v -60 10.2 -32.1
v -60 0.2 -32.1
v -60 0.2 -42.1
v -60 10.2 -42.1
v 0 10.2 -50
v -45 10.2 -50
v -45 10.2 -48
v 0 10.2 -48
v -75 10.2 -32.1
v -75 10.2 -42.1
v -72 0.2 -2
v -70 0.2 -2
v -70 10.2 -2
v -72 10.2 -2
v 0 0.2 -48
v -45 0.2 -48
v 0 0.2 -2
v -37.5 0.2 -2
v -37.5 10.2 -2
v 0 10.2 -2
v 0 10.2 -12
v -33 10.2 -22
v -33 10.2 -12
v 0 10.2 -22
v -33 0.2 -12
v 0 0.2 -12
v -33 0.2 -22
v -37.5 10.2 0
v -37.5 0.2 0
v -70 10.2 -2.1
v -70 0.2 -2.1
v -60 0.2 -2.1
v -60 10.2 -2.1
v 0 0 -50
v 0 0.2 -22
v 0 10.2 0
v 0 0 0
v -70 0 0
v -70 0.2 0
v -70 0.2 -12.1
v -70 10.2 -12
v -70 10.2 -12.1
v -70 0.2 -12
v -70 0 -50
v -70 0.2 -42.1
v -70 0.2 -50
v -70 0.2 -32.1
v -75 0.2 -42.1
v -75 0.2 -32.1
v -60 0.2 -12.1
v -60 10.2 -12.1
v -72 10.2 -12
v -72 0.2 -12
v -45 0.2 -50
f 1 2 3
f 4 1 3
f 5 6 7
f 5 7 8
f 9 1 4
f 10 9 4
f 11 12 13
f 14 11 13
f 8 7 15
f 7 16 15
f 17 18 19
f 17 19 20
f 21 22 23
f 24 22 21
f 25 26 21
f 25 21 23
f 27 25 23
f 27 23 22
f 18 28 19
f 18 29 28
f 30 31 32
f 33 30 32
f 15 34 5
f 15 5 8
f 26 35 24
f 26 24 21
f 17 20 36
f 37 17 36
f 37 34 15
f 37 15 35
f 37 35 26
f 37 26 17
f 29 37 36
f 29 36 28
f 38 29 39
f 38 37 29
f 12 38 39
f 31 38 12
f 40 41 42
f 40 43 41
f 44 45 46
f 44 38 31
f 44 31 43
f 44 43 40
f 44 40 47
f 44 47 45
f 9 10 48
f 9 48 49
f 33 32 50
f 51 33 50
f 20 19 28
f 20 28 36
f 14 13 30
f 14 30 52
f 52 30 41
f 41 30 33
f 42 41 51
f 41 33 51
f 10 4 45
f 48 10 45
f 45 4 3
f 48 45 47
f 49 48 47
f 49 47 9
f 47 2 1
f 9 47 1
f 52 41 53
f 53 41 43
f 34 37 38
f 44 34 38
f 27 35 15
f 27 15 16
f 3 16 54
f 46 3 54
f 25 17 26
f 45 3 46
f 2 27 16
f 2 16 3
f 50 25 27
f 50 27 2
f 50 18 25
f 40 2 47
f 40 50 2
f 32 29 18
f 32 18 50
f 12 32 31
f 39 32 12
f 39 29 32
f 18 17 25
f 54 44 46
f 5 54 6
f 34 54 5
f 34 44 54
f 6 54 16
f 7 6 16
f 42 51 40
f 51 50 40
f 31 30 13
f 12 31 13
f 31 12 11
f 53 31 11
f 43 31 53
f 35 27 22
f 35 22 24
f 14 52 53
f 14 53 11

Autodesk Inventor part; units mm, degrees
ref_plane "YZ Plane" through (0, 0, 0) normal (1, 0, 0) x (0, 1, 0)
ref_plane "XZ Plane" through (0, 0, 0) normal (0, 1, 0) x (-1, 0, 0)
ref_plane "XY Plane" through (0, 0, 0) normal (0, 0, 1) x (1, 0, 0)
sketch "Esboço3" plane through (0, 0, 0) normal (0, 1, 0) x (-1, 0, 0)
  line L0 (0, 0) -> (70, 0)
  line L1 (70, 0) -> (70, -50)
  line L2 (70, -50) -> (0, -50)
  line L3 (0, -50) -> (0, 0)
  dimension "d4" = 70
  dimension "d5" = 50
extrude "Extrusão2" add sketch "Esboço3" along normal blind 0.2
sketch "Esboço4" plane through (0, 0.2, 0) normal (0, 1, 0) x (1, 0, 0)
  line L0 (0, 0) -> (0, 50) projected
  line L1 (0, 50) -> (-45, 50)
  line L2 (-45, 50) -> (-45, 48)
  line L3 (-45, 48) -> (0, 48)
  line L4 (0, 48) -> (0, 50)
  line L5 (-70, 0) -> (0, 0) projected
  line L6 (0, 0) -> (-37.5, 0)
  line L7 (-37.5, 0) -> (-37.5, 2)
  line L8 (-37.5, 2) -> (0, 2)
  line L9 (0, 2) -> (0, 0)
  line L10 (0, 2) -> (0, 12)
  line L11 (0, 12) -> (-33, 12)
  line L12 (-33, 12) -> (-33, 22)
  line L13 (-33, 22) -> (0, 22)
  line L14 (0, 22) -> (0, 12)
  dimension "d8" = 45
  dimension "d9" = 2
  dimension "d10" = 37.5
  dimension "d11" = 2
  dimension "d12" = 10
  dimension "d13" = 33
  dimension "d14" = 10
extrude "Extrusão3" add sketch "Esboço4" along normal blind 10
sketch "Esboço5" plane through (0, 0.2, 0) normal (0, 1, 0) x (1, 0, 0)
  line L0 (-70, 0) -> (-70, 2.1)
  line L1 (-70, 50) -> (-70, 0) projected
  line L2 (-70, 2.1) -> (-60, 2.1)
  line L3 (-60, 2.1) -> (-60, 12.1)
  line L4 (-60, 12.1) -> (-72, 12.1)
  line L5 (-60, 2.1) -> (-72, 2.1)
  line L6 (-72, 2.1) -> (-72, 12.1)
  line L7 (-72, 12.1) -> (-60, 12.1)
  line L8 (-60, 12.1) -> (-60, 2.1)
  point P0 (0, 0)
  point P1 (-70, 12.1)
extrude "Extrusão4" add sketch "Esboço5" along normal blind 10 contours L4 L3 L2 L1
sketch "Esboço7" plane through (-70, 0, -50) normal (-1, 0, 0) x (0, 0, 1)
  line L0 (48, 0.2) -> (48, 10.2) projected
  line L1 (48, 0.2) -> (38, 0.2) projected
  line L2 (48, 10.2) -> (38, 10.2)
  line L3 (38, 10.2) -> (38, 0.2)
  line L4 (38, 0.2) -> (48, 0.2)
  line L5 (48, 0.2) -> (48, 10.2)
  point P0 (50, 0)
extrude "Extrusão5" add sketch "Esboço7" along normal blind 2
sketch "Esboço8" plane through (0, 0.2, 0) normal (0, 1, 0) x (1, 0, 0)
  line L0 (-60, 12.1) -> (-70, 12.1) projected
  line L1 (-70, 12.1) -> (-70, 32.1)
  line L2 (-70, 50) -> (-70, 12.1) projected
  line L3 (-70, 32.1) -> (-70, 39.6)
  line L4 (-70, 32.1) -> (-60, 32.1)
  line L5 (-60, 32.1) -> (-60, 42.1)
  line L6 (-60, 42.1) -> (-70, 42.1)
  line L7 (-70, 42.1) -> (-70, 32.1)
  point P0 (0, 0)
extrude "Extrusão6" add sketch "Esboço8" along normal blind 10
sketch "Esboço9" plane through (-70, 0, -50) normal (-1, 0, 0) x (0, 0, 1)
  line L0 (17.9, 10.2) -> (7.9, 10.2)
  line L1 (7.9, 10.2) -> (7.9, 0.2)
  line L2 (7.9, 0.2) -> (17.9, 0.2)
  line L3 (17.9, 0.2) -> (17.9, 10.2)
  point P0 (50, 0)
  dimension "d32" = 10
  dimension "d33" = 10
extrude "Extrusão7" add sketch "Esboço9" along normal blind 5
properties part number "arduinoUNO"
